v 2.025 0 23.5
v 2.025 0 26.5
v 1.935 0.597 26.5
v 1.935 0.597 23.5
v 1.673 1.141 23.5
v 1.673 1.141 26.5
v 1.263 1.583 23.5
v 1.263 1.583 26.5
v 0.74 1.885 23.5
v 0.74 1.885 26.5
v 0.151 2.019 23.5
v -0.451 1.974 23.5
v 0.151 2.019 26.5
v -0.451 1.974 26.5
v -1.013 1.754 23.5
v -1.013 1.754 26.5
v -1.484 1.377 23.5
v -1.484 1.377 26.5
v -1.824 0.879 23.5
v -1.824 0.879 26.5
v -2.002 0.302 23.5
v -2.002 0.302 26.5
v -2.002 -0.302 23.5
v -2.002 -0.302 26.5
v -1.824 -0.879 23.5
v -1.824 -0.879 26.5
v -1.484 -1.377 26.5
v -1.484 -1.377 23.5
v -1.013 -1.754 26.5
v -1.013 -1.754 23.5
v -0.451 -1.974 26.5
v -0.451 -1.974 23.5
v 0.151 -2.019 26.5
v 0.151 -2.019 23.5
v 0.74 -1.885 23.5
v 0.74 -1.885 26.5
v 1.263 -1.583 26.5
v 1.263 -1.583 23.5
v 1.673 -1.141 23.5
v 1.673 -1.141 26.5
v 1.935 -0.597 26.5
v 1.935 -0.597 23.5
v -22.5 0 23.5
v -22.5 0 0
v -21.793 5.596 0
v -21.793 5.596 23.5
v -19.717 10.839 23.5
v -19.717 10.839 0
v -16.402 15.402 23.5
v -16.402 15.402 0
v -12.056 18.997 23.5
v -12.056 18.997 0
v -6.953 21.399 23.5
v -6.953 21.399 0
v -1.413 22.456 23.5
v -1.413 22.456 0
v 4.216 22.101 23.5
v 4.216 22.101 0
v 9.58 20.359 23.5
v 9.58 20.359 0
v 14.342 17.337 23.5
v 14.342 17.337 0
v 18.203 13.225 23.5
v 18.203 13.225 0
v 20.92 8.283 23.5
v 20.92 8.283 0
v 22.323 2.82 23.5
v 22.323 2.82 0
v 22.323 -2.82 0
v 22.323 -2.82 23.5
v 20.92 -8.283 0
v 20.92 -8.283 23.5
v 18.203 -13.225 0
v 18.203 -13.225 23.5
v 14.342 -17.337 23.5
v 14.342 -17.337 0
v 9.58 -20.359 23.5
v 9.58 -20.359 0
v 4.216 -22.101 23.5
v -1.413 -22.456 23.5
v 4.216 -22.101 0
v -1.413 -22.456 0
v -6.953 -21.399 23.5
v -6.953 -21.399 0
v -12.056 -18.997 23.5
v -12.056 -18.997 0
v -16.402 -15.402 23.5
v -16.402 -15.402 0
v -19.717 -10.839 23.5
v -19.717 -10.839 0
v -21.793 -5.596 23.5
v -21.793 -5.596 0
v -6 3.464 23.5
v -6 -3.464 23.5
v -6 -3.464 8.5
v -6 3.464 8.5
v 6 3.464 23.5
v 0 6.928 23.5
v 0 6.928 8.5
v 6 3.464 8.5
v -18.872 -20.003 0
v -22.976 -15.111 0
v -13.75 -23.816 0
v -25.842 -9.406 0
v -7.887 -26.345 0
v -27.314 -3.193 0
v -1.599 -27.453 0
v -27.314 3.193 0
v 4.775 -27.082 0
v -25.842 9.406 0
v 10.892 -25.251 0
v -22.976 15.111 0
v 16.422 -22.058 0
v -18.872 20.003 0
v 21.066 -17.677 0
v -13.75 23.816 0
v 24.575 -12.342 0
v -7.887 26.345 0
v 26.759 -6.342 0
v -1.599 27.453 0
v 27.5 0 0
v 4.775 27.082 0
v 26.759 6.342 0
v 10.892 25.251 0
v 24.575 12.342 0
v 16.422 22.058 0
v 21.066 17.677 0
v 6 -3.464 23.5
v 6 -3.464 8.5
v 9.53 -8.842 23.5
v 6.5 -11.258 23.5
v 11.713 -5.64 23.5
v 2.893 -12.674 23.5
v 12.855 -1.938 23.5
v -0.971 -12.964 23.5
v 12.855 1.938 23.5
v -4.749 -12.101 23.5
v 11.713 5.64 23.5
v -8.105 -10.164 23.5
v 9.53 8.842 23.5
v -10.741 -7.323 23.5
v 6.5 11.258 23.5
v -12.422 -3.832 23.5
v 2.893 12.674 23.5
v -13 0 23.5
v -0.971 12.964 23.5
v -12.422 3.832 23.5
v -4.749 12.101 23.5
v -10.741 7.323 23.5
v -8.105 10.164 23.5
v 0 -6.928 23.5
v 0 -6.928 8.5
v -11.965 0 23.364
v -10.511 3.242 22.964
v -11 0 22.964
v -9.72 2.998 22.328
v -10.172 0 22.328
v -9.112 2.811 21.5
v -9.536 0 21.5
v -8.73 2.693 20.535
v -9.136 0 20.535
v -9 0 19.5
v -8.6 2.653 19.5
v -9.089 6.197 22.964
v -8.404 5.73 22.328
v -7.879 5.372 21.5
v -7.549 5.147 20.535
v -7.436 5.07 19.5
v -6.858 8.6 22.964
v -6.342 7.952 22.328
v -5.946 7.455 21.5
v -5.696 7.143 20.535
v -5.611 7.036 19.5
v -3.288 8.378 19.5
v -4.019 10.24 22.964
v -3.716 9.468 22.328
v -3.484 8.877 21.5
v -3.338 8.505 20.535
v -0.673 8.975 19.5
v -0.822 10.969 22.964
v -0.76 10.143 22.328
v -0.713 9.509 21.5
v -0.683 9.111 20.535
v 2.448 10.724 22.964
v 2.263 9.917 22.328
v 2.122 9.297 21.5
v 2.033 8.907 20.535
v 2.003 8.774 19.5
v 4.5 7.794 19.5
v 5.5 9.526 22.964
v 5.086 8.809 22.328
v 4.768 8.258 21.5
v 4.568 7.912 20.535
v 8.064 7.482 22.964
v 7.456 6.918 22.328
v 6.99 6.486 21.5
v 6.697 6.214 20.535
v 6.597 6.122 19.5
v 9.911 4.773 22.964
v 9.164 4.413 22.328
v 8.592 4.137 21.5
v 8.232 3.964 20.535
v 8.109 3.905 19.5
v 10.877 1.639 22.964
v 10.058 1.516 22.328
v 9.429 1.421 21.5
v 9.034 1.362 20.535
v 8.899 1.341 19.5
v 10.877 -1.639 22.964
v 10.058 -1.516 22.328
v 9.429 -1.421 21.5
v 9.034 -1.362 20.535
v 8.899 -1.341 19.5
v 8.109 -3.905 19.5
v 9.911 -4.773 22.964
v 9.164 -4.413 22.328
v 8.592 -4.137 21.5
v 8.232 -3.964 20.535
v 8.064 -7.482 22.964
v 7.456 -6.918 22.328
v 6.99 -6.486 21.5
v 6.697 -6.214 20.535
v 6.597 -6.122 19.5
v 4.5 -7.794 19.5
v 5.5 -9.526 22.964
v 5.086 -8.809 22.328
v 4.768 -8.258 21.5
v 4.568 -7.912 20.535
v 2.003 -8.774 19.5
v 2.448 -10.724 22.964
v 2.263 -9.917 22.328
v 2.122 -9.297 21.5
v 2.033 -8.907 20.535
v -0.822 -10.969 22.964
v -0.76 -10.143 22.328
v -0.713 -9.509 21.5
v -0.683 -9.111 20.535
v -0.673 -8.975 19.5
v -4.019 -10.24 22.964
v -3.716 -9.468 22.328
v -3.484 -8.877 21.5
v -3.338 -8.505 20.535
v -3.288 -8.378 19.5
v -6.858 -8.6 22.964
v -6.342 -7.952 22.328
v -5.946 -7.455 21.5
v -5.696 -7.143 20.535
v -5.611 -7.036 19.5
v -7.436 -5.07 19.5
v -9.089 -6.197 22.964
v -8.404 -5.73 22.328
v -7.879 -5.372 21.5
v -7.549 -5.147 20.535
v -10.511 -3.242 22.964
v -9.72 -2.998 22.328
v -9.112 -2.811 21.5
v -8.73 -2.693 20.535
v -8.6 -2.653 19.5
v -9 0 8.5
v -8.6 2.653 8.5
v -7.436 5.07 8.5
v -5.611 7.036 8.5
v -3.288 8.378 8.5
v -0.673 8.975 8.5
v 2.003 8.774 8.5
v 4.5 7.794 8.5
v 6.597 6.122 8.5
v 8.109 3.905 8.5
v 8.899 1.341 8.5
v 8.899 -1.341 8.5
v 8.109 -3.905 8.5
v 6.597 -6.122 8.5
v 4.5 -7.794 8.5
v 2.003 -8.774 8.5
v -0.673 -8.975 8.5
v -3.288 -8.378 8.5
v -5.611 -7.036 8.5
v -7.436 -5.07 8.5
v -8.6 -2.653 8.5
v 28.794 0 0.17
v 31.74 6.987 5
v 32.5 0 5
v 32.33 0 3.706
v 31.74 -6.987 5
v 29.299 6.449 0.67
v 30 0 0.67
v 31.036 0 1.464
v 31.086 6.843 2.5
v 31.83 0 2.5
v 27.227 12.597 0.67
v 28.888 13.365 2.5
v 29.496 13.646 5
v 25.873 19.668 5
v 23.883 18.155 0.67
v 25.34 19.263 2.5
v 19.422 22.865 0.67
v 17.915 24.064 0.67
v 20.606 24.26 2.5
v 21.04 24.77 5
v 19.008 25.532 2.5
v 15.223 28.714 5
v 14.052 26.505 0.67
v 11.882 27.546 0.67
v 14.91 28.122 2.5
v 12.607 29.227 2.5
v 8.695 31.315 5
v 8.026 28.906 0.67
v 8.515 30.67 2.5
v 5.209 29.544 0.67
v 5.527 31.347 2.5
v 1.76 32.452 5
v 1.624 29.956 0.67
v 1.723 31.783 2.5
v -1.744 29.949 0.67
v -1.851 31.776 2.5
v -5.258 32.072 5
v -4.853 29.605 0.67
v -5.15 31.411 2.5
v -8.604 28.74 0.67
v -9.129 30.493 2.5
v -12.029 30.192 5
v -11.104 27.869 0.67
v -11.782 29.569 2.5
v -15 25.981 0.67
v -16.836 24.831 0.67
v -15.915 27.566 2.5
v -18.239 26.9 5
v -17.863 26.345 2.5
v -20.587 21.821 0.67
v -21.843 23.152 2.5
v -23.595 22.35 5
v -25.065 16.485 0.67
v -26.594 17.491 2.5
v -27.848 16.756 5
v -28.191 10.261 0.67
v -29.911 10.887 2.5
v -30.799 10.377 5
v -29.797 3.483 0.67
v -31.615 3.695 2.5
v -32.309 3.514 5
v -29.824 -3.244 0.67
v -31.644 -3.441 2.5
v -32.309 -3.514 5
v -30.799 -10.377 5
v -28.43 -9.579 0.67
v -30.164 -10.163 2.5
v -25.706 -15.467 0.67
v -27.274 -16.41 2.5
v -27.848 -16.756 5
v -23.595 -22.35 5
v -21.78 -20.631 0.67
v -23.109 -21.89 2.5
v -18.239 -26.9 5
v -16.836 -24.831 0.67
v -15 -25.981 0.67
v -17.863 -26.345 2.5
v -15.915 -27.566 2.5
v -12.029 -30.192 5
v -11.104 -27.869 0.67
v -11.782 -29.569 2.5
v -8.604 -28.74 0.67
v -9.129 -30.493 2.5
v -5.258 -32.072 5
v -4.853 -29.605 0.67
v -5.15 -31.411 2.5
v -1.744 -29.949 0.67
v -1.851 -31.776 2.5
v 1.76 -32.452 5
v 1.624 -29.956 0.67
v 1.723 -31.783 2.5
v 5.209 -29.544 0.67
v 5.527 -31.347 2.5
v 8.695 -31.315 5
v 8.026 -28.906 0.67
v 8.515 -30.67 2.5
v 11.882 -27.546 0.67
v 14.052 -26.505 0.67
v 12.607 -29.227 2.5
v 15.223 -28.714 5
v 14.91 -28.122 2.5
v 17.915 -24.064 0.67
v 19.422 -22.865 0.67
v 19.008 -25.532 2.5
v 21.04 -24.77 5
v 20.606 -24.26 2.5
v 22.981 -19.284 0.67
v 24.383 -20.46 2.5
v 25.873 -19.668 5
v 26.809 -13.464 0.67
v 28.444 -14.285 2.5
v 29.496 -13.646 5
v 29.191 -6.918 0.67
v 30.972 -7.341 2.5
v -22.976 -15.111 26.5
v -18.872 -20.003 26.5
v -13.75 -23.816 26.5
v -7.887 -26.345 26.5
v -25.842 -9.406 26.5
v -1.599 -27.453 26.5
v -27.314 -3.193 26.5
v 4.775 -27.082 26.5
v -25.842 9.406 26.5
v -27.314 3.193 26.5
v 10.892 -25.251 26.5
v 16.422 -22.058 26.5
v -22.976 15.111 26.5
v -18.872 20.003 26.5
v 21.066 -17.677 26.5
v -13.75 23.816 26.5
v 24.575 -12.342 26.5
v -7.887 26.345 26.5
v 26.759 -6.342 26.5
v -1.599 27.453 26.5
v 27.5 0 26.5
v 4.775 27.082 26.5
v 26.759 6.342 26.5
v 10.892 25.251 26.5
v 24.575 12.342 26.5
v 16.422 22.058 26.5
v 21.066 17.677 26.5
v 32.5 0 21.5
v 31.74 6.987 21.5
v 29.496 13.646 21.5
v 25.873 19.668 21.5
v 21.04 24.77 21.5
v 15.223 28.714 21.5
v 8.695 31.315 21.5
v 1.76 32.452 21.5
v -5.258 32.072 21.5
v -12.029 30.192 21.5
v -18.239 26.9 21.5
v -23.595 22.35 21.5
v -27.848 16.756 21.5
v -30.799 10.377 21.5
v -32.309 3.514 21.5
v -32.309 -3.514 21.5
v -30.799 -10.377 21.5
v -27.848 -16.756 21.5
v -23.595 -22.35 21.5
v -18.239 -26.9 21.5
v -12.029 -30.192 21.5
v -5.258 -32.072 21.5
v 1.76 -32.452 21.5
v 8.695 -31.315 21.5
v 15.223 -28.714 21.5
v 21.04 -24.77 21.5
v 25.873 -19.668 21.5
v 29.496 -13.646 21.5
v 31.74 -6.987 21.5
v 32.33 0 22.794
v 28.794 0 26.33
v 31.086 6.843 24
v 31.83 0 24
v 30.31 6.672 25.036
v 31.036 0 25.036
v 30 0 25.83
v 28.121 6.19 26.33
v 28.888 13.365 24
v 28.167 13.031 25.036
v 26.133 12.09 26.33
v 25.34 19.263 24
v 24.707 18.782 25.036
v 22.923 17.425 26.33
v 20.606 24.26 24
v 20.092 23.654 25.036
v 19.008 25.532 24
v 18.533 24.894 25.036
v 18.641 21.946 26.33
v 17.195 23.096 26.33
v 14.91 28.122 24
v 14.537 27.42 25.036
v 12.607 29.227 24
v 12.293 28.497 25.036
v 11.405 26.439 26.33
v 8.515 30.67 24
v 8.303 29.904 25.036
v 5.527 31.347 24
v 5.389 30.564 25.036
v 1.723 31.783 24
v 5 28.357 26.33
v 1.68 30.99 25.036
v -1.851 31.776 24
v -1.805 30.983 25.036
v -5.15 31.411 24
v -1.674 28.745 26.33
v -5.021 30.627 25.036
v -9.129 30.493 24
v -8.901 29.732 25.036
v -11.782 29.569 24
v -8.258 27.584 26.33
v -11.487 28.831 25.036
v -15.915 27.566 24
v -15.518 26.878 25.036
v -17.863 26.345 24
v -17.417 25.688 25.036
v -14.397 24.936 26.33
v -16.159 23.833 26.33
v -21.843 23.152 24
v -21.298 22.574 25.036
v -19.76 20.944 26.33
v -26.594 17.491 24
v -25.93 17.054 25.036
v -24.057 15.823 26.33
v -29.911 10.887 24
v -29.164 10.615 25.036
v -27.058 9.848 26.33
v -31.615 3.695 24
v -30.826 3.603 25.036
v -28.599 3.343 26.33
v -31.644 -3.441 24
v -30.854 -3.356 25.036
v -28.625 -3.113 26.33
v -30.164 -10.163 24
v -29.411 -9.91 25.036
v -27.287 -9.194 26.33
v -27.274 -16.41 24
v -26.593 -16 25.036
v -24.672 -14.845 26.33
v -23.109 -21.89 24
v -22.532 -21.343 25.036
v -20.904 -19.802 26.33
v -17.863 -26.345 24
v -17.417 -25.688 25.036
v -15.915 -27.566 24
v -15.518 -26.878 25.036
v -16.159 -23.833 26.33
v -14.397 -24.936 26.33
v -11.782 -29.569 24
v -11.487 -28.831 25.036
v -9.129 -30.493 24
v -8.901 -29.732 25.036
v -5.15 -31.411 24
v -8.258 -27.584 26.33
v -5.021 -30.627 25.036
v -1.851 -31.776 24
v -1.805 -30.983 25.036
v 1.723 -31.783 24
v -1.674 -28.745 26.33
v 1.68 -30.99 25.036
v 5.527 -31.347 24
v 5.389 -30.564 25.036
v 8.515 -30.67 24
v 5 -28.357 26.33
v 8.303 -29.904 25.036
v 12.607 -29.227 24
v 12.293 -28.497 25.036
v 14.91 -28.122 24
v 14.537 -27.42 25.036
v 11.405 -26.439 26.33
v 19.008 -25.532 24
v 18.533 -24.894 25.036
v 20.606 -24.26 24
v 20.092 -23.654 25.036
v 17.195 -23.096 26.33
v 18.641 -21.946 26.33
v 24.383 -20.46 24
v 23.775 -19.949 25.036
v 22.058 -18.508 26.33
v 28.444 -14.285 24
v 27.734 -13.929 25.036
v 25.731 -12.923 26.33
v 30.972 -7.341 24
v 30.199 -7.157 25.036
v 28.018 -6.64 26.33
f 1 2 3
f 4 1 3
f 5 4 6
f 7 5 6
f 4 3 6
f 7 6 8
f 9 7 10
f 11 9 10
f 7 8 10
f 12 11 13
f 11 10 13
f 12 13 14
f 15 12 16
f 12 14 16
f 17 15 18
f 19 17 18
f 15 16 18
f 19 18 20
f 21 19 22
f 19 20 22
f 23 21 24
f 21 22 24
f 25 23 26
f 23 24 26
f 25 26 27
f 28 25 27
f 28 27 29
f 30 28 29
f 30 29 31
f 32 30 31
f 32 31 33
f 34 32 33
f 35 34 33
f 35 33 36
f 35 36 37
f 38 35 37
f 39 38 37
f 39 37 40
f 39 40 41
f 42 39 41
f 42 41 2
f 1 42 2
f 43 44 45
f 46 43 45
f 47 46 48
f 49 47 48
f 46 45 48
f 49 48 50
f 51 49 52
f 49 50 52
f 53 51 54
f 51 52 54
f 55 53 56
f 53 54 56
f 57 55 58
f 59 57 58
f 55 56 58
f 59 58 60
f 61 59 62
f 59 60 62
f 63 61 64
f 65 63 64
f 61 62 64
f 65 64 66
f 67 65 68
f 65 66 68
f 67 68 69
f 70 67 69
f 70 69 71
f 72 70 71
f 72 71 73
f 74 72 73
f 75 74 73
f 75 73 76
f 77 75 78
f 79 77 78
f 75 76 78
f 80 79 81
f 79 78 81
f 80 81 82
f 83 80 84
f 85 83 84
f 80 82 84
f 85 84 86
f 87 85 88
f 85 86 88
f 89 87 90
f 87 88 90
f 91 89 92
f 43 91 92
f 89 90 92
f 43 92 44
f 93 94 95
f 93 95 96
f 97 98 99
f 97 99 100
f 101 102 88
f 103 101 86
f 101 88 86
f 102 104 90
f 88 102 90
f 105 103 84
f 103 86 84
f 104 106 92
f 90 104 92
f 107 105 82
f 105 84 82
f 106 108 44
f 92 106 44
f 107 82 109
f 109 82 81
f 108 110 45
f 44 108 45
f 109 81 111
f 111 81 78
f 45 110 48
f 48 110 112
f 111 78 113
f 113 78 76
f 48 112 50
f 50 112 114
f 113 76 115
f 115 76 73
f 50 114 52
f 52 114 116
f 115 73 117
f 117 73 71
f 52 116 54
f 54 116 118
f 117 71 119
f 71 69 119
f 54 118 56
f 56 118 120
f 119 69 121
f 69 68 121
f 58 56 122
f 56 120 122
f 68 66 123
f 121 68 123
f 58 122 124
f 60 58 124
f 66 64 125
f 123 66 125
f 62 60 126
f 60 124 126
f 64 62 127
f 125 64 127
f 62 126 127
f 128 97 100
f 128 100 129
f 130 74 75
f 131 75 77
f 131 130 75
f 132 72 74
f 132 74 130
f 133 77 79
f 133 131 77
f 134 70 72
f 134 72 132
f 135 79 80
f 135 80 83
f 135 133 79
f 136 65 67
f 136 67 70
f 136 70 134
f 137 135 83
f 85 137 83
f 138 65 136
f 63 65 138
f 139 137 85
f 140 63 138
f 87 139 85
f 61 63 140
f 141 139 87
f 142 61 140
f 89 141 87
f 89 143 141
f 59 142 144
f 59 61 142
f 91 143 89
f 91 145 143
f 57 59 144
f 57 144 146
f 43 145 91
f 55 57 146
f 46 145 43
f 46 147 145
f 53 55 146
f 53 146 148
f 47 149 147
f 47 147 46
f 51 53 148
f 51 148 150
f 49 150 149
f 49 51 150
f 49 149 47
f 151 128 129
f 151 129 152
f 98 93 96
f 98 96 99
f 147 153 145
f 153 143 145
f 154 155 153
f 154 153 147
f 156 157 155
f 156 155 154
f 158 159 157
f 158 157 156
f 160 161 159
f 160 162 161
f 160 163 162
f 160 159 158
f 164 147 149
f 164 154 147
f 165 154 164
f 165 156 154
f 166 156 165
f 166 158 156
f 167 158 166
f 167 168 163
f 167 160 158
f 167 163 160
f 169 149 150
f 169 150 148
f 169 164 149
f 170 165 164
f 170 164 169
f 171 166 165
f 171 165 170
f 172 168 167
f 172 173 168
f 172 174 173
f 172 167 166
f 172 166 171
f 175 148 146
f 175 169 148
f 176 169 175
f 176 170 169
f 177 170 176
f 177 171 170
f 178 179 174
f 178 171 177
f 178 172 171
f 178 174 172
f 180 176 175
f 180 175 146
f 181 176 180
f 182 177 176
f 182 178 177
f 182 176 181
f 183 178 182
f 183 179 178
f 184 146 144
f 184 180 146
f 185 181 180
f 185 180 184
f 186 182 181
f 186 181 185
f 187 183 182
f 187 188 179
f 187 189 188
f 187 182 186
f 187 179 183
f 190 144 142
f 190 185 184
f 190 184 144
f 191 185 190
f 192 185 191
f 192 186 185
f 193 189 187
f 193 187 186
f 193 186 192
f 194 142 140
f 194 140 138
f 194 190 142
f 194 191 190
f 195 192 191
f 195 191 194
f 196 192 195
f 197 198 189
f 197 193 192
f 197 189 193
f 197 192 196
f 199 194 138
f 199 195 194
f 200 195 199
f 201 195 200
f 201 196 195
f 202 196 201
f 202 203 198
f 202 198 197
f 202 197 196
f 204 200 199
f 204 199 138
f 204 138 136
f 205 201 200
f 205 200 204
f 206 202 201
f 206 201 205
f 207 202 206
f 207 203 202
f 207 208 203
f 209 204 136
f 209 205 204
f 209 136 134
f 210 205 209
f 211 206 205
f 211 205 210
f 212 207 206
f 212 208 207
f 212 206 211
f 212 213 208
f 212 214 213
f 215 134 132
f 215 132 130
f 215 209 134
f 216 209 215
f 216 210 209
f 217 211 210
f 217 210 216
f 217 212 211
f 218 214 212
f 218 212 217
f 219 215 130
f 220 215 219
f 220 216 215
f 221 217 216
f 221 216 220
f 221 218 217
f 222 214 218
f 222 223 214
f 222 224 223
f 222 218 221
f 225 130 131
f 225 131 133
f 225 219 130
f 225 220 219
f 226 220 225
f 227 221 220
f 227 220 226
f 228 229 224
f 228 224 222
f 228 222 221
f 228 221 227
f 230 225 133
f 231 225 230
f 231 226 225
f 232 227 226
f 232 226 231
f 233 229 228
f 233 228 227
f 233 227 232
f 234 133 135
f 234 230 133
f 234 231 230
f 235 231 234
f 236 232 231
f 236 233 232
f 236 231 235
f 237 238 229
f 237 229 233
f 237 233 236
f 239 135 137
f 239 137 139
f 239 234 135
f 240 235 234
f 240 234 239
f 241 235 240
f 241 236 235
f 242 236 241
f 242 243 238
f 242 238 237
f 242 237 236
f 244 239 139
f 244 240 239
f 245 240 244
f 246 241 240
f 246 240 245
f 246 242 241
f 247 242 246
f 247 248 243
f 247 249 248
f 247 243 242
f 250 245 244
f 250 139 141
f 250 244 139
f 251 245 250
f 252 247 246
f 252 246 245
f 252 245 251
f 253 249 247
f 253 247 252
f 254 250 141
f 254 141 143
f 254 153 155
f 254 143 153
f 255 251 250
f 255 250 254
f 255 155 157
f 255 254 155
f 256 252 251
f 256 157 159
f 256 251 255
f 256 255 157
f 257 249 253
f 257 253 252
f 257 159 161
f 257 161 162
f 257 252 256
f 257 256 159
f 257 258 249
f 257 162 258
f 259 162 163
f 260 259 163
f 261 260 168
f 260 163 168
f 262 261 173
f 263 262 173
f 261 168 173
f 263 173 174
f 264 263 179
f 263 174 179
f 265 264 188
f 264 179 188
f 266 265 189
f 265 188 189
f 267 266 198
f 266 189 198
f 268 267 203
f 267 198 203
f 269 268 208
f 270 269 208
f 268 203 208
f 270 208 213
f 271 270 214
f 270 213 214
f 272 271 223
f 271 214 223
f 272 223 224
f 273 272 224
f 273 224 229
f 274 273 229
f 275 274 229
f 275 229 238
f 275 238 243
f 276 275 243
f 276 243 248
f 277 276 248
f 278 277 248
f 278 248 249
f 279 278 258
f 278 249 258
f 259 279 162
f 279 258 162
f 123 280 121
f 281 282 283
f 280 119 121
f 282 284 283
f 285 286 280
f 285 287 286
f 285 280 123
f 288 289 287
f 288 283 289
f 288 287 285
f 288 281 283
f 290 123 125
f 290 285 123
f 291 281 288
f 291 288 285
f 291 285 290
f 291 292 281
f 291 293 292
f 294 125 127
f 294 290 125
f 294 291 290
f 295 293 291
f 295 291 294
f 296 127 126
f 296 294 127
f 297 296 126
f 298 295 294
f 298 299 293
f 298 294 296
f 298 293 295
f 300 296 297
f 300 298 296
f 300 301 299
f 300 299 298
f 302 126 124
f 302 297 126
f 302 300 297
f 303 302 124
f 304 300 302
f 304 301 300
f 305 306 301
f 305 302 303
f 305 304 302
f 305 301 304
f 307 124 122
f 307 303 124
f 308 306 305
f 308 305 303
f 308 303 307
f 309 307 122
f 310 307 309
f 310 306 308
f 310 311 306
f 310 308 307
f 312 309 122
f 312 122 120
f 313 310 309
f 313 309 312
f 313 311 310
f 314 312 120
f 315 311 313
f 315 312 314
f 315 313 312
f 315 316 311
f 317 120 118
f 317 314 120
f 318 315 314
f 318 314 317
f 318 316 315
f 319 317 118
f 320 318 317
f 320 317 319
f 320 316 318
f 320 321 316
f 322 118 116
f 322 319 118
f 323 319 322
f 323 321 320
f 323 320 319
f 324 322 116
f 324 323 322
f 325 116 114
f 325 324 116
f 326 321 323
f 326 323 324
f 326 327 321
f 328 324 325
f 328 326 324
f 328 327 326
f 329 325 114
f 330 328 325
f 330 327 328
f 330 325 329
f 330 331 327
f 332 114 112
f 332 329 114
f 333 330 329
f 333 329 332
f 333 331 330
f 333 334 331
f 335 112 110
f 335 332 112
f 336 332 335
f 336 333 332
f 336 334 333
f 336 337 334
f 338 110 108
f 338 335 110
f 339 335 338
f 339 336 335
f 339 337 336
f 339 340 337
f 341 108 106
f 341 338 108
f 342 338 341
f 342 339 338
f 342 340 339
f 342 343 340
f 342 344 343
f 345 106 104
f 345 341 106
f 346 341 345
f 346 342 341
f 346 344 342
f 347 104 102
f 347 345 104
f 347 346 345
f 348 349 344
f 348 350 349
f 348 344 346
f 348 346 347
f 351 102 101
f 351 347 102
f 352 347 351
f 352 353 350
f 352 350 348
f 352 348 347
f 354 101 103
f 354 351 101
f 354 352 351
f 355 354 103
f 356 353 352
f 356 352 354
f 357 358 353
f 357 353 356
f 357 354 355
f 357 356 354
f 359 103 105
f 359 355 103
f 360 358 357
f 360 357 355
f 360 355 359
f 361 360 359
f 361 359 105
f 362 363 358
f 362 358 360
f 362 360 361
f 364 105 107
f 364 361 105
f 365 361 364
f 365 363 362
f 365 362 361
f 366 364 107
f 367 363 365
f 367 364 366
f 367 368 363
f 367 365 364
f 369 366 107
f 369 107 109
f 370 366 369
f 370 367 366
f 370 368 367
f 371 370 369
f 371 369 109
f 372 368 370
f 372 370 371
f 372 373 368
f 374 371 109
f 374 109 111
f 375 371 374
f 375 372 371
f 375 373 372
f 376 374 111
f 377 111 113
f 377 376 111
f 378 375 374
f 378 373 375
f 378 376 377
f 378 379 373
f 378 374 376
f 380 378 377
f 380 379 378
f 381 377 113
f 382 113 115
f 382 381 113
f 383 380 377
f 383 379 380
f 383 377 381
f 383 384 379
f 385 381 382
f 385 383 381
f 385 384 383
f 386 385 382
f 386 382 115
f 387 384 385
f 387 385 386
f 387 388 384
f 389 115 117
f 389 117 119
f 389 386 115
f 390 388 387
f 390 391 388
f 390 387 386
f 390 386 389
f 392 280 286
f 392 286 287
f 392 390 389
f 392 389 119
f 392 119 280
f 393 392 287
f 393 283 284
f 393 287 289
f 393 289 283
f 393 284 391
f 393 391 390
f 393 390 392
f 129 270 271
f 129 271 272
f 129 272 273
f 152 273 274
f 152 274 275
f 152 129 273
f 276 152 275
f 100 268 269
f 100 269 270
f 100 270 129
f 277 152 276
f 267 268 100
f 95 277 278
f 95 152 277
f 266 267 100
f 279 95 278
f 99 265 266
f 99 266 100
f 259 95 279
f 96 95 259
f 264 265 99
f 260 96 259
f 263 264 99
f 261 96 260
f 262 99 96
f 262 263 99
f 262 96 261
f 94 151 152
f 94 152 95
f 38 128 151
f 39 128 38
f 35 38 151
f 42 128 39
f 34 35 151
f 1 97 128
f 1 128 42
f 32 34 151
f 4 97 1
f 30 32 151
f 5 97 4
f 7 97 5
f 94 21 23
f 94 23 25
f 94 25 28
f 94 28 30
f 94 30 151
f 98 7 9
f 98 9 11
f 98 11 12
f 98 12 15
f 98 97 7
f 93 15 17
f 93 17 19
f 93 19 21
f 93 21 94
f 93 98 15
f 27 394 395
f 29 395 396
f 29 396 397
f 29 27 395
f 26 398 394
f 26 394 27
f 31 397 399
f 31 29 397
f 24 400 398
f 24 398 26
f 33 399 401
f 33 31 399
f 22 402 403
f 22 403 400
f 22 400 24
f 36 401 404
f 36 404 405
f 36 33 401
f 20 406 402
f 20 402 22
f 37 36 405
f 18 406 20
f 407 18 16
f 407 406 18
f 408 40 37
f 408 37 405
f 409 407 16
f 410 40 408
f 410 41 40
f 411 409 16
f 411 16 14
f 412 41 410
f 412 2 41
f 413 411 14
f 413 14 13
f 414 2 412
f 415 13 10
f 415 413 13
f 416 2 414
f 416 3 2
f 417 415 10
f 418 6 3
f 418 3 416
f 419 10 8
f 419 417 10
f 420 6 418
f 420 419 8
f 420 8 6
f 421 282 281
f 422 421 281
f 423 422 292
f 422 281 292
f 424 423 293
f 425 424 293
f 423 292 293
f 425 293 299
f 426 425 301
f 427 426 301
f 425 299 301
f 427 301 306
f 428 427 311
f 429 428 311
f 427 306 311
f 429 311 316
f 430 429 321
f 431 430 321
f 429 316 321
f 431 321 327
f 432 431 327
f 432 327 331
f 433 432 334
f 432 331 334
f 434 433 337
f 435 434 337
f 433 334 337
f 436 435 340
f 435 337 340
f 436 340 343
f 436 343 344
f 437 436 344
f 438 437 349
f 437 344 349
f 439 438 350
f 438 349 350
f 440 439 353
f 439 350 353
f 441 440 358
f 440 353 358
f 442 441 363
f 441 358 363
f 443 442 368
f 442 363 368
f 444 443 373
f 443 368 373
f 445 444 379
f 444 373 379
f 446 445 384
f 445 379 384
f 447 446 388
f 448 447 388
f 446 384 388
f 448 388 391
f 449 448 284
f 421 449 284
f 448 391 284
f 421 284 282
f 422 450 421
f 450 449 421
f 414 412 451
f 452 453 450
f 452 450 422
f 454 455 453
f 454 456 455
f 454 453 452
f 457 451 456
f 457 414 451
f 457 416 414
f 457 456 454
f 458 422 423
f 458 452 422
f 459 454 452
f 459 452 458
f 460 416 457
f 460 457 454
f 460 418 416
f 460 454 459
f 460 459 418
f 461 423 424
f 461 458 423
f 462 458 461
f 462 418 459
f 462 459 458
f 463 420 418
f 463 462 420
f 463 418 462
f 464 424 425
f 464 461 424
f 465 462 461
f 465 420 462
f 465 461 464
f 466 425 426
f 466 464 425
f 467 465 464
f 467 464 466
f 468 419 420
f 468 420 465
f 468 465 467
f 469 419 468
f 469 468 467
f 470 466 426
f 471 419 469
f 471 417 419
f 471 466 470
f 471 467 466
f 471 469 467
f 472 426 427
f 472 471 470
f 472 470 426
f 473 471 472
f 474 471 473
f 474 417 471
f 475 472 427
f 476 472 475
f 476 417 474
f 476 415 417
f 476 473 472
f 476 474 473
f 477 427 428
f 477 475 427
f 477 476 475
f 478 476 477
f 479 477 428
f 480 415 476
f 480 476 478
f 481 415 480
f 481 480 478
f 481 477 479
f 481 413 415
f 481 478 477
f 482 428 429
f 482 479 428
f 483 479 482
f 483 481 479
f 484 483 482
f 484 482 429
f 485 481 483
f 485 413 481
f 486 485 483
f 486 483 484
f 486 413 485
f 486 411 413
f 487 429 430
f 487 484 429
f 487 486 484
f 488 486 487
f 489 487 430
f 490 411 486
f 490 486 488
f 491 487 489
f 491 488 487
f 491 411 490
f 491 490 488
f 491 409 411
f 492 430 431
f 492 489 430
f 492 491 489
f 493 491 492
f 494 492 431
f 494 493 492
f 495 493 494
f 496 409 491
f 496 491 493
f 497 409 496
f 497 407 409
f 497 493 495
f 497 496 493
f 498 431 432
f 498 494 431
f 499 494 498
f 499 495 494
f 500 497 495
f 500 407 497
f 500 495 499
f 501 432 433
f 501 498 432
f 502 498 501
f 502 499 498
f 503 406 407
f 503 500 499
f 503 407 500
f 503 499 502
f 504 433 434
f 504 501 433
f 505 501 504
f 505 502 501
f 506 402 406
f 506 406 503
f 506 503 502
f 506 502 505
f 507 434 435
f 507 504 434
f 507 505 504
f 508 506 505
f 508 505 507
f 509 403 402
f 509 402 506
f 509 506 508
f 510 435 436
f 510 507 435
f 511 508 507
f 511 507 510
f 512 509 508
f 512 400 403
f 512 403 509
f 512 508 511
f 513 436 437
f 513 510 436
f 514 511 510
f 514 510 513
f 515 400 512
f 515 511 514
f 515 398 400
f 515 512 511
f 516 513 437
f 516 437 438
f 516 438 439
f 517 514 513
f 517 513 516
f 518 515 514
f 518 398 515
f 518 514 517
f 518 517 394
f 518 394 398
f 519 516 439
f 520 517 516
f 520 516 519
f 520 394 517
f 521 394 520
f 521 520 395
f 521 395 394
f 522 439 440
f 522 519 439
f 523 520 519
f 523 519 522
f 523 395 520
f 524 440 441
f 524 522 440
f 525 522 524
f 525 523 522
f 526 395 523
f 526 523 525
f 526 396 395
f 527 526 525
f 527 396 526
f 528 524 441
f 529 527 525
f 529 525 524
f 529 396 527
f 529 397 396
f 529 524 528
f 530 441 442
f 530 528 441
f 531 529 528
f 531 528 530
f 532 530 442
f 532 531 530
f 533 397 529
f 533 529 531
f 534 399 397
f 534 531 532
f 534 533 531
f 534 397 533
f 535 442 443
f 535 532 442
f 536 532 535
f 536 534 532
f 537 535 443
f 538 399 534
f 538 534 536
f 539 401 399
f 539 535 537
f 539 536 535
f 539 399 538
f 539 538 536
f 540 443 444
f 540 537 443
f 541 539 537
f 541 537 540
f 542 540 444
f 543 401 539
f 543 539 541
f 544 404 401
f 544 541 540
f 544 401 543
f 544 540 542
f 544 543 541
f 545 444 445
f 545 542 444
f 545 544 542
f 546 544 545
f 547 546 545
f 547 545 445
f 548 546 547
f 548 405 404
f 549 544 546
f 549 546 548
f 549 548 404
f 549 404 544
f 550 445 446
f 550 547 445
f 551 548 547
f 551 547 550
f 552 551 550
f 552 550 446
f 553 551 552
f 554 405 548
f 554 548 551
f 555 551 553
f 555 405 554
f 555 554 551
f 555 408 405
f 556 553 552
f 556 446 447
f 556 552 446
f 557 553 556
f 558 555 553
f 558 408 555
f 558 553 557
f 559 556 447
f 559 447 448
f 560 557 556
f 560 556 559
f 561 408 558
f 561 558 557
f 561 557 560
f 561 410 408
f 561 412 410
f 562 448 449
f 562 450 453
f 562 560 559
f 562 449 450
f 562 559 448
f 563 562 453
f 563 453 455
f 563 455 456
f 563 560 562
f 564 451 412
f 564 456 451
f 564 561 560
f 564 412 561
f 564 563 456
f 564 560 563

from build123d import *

# Parameters (mm, degrees)
ESBO_O1_R                = 32.5
RESSALTO_EXTRUS_O1_DEPTH = 26.5
ESBO_O2_R                = 22.5
CORTE_EXTRUS_O1_DEPTH    = 23.5
ESBO_O3_R                = 9
RESSALTO_EXTRUS_O2_DEPTH = 15
FILETE1_R                = 4
ESBO_O4_R                = 2.025
CORTE_EXTRUS_O2_DEPTH    = 27.5
FILLET1_R                = 5


with BuildPart() as part:
    # Esboço1 → Ressalto-extrusão1 (new body)
    with BuildSketch(Plane.XY):
        Circle(ESBO_O1_R)
    extrude(amount=RESSALTO_EXTRUS_O1_DEPTH)

    # Esboço2 → Corte-extrusão1 (cut)
    with BuildSketch(Plane(origin=(0, 0, 0), x_dir=(-1, 0, 0), z_dir=(0, 0, -1))):
        Circle(ESBO_O2_R)
    extrude(amount=-CORTE_EXTRUS_O1_DEPTH, mode=Mode.SUBTRACT)

    # Esboço3 → Ressalto-extrusão2 (add)
    with BuildSketch(Plane(origin=(0, 0, 23.5), x_dir=(-1, 0, 0), z_dir=(0, 0, -1))):
        Circle(ESBO_O3_R)
        Polygon((6, -3.464101615), (6, 3.464101615), (0, 6.92820323), (-6, 3.464101615), (-6, -3.464101615), (0, -6.92820323), align=None, mode=Mode.SUBTRACT)
    extrude(amount=RESSALTO_EXTRUS_O2_DEPTH)

    # Filete1
    filete1_edges = [part.edges().sort_by_distance(p)[0] for p in [
        (9, 0, 23.5),
    ]]
    fillet(filete1_edges, radius=FILETE1_R)

    # Esboço4 → Corte-extrusão2 (cut, through all)
    with BuildSketch(Plane.XY.offset(26.5)):
        Circle(ESBO_O4_R)
    extrude(amount=-CORTE_EXTRUS_O2_DEPTH, mode=Mode.SUBTRACT)

    # Fillet1
    fillet1_edges = [part.edges().sort_by_distance(p)[0] for p in [
        (-32.5, 0, 0),
        (-32.5, 0, 26.5),
    ]]
    fillet(fillet1_edges, radius=FILLET1_R)


solid = part.part
